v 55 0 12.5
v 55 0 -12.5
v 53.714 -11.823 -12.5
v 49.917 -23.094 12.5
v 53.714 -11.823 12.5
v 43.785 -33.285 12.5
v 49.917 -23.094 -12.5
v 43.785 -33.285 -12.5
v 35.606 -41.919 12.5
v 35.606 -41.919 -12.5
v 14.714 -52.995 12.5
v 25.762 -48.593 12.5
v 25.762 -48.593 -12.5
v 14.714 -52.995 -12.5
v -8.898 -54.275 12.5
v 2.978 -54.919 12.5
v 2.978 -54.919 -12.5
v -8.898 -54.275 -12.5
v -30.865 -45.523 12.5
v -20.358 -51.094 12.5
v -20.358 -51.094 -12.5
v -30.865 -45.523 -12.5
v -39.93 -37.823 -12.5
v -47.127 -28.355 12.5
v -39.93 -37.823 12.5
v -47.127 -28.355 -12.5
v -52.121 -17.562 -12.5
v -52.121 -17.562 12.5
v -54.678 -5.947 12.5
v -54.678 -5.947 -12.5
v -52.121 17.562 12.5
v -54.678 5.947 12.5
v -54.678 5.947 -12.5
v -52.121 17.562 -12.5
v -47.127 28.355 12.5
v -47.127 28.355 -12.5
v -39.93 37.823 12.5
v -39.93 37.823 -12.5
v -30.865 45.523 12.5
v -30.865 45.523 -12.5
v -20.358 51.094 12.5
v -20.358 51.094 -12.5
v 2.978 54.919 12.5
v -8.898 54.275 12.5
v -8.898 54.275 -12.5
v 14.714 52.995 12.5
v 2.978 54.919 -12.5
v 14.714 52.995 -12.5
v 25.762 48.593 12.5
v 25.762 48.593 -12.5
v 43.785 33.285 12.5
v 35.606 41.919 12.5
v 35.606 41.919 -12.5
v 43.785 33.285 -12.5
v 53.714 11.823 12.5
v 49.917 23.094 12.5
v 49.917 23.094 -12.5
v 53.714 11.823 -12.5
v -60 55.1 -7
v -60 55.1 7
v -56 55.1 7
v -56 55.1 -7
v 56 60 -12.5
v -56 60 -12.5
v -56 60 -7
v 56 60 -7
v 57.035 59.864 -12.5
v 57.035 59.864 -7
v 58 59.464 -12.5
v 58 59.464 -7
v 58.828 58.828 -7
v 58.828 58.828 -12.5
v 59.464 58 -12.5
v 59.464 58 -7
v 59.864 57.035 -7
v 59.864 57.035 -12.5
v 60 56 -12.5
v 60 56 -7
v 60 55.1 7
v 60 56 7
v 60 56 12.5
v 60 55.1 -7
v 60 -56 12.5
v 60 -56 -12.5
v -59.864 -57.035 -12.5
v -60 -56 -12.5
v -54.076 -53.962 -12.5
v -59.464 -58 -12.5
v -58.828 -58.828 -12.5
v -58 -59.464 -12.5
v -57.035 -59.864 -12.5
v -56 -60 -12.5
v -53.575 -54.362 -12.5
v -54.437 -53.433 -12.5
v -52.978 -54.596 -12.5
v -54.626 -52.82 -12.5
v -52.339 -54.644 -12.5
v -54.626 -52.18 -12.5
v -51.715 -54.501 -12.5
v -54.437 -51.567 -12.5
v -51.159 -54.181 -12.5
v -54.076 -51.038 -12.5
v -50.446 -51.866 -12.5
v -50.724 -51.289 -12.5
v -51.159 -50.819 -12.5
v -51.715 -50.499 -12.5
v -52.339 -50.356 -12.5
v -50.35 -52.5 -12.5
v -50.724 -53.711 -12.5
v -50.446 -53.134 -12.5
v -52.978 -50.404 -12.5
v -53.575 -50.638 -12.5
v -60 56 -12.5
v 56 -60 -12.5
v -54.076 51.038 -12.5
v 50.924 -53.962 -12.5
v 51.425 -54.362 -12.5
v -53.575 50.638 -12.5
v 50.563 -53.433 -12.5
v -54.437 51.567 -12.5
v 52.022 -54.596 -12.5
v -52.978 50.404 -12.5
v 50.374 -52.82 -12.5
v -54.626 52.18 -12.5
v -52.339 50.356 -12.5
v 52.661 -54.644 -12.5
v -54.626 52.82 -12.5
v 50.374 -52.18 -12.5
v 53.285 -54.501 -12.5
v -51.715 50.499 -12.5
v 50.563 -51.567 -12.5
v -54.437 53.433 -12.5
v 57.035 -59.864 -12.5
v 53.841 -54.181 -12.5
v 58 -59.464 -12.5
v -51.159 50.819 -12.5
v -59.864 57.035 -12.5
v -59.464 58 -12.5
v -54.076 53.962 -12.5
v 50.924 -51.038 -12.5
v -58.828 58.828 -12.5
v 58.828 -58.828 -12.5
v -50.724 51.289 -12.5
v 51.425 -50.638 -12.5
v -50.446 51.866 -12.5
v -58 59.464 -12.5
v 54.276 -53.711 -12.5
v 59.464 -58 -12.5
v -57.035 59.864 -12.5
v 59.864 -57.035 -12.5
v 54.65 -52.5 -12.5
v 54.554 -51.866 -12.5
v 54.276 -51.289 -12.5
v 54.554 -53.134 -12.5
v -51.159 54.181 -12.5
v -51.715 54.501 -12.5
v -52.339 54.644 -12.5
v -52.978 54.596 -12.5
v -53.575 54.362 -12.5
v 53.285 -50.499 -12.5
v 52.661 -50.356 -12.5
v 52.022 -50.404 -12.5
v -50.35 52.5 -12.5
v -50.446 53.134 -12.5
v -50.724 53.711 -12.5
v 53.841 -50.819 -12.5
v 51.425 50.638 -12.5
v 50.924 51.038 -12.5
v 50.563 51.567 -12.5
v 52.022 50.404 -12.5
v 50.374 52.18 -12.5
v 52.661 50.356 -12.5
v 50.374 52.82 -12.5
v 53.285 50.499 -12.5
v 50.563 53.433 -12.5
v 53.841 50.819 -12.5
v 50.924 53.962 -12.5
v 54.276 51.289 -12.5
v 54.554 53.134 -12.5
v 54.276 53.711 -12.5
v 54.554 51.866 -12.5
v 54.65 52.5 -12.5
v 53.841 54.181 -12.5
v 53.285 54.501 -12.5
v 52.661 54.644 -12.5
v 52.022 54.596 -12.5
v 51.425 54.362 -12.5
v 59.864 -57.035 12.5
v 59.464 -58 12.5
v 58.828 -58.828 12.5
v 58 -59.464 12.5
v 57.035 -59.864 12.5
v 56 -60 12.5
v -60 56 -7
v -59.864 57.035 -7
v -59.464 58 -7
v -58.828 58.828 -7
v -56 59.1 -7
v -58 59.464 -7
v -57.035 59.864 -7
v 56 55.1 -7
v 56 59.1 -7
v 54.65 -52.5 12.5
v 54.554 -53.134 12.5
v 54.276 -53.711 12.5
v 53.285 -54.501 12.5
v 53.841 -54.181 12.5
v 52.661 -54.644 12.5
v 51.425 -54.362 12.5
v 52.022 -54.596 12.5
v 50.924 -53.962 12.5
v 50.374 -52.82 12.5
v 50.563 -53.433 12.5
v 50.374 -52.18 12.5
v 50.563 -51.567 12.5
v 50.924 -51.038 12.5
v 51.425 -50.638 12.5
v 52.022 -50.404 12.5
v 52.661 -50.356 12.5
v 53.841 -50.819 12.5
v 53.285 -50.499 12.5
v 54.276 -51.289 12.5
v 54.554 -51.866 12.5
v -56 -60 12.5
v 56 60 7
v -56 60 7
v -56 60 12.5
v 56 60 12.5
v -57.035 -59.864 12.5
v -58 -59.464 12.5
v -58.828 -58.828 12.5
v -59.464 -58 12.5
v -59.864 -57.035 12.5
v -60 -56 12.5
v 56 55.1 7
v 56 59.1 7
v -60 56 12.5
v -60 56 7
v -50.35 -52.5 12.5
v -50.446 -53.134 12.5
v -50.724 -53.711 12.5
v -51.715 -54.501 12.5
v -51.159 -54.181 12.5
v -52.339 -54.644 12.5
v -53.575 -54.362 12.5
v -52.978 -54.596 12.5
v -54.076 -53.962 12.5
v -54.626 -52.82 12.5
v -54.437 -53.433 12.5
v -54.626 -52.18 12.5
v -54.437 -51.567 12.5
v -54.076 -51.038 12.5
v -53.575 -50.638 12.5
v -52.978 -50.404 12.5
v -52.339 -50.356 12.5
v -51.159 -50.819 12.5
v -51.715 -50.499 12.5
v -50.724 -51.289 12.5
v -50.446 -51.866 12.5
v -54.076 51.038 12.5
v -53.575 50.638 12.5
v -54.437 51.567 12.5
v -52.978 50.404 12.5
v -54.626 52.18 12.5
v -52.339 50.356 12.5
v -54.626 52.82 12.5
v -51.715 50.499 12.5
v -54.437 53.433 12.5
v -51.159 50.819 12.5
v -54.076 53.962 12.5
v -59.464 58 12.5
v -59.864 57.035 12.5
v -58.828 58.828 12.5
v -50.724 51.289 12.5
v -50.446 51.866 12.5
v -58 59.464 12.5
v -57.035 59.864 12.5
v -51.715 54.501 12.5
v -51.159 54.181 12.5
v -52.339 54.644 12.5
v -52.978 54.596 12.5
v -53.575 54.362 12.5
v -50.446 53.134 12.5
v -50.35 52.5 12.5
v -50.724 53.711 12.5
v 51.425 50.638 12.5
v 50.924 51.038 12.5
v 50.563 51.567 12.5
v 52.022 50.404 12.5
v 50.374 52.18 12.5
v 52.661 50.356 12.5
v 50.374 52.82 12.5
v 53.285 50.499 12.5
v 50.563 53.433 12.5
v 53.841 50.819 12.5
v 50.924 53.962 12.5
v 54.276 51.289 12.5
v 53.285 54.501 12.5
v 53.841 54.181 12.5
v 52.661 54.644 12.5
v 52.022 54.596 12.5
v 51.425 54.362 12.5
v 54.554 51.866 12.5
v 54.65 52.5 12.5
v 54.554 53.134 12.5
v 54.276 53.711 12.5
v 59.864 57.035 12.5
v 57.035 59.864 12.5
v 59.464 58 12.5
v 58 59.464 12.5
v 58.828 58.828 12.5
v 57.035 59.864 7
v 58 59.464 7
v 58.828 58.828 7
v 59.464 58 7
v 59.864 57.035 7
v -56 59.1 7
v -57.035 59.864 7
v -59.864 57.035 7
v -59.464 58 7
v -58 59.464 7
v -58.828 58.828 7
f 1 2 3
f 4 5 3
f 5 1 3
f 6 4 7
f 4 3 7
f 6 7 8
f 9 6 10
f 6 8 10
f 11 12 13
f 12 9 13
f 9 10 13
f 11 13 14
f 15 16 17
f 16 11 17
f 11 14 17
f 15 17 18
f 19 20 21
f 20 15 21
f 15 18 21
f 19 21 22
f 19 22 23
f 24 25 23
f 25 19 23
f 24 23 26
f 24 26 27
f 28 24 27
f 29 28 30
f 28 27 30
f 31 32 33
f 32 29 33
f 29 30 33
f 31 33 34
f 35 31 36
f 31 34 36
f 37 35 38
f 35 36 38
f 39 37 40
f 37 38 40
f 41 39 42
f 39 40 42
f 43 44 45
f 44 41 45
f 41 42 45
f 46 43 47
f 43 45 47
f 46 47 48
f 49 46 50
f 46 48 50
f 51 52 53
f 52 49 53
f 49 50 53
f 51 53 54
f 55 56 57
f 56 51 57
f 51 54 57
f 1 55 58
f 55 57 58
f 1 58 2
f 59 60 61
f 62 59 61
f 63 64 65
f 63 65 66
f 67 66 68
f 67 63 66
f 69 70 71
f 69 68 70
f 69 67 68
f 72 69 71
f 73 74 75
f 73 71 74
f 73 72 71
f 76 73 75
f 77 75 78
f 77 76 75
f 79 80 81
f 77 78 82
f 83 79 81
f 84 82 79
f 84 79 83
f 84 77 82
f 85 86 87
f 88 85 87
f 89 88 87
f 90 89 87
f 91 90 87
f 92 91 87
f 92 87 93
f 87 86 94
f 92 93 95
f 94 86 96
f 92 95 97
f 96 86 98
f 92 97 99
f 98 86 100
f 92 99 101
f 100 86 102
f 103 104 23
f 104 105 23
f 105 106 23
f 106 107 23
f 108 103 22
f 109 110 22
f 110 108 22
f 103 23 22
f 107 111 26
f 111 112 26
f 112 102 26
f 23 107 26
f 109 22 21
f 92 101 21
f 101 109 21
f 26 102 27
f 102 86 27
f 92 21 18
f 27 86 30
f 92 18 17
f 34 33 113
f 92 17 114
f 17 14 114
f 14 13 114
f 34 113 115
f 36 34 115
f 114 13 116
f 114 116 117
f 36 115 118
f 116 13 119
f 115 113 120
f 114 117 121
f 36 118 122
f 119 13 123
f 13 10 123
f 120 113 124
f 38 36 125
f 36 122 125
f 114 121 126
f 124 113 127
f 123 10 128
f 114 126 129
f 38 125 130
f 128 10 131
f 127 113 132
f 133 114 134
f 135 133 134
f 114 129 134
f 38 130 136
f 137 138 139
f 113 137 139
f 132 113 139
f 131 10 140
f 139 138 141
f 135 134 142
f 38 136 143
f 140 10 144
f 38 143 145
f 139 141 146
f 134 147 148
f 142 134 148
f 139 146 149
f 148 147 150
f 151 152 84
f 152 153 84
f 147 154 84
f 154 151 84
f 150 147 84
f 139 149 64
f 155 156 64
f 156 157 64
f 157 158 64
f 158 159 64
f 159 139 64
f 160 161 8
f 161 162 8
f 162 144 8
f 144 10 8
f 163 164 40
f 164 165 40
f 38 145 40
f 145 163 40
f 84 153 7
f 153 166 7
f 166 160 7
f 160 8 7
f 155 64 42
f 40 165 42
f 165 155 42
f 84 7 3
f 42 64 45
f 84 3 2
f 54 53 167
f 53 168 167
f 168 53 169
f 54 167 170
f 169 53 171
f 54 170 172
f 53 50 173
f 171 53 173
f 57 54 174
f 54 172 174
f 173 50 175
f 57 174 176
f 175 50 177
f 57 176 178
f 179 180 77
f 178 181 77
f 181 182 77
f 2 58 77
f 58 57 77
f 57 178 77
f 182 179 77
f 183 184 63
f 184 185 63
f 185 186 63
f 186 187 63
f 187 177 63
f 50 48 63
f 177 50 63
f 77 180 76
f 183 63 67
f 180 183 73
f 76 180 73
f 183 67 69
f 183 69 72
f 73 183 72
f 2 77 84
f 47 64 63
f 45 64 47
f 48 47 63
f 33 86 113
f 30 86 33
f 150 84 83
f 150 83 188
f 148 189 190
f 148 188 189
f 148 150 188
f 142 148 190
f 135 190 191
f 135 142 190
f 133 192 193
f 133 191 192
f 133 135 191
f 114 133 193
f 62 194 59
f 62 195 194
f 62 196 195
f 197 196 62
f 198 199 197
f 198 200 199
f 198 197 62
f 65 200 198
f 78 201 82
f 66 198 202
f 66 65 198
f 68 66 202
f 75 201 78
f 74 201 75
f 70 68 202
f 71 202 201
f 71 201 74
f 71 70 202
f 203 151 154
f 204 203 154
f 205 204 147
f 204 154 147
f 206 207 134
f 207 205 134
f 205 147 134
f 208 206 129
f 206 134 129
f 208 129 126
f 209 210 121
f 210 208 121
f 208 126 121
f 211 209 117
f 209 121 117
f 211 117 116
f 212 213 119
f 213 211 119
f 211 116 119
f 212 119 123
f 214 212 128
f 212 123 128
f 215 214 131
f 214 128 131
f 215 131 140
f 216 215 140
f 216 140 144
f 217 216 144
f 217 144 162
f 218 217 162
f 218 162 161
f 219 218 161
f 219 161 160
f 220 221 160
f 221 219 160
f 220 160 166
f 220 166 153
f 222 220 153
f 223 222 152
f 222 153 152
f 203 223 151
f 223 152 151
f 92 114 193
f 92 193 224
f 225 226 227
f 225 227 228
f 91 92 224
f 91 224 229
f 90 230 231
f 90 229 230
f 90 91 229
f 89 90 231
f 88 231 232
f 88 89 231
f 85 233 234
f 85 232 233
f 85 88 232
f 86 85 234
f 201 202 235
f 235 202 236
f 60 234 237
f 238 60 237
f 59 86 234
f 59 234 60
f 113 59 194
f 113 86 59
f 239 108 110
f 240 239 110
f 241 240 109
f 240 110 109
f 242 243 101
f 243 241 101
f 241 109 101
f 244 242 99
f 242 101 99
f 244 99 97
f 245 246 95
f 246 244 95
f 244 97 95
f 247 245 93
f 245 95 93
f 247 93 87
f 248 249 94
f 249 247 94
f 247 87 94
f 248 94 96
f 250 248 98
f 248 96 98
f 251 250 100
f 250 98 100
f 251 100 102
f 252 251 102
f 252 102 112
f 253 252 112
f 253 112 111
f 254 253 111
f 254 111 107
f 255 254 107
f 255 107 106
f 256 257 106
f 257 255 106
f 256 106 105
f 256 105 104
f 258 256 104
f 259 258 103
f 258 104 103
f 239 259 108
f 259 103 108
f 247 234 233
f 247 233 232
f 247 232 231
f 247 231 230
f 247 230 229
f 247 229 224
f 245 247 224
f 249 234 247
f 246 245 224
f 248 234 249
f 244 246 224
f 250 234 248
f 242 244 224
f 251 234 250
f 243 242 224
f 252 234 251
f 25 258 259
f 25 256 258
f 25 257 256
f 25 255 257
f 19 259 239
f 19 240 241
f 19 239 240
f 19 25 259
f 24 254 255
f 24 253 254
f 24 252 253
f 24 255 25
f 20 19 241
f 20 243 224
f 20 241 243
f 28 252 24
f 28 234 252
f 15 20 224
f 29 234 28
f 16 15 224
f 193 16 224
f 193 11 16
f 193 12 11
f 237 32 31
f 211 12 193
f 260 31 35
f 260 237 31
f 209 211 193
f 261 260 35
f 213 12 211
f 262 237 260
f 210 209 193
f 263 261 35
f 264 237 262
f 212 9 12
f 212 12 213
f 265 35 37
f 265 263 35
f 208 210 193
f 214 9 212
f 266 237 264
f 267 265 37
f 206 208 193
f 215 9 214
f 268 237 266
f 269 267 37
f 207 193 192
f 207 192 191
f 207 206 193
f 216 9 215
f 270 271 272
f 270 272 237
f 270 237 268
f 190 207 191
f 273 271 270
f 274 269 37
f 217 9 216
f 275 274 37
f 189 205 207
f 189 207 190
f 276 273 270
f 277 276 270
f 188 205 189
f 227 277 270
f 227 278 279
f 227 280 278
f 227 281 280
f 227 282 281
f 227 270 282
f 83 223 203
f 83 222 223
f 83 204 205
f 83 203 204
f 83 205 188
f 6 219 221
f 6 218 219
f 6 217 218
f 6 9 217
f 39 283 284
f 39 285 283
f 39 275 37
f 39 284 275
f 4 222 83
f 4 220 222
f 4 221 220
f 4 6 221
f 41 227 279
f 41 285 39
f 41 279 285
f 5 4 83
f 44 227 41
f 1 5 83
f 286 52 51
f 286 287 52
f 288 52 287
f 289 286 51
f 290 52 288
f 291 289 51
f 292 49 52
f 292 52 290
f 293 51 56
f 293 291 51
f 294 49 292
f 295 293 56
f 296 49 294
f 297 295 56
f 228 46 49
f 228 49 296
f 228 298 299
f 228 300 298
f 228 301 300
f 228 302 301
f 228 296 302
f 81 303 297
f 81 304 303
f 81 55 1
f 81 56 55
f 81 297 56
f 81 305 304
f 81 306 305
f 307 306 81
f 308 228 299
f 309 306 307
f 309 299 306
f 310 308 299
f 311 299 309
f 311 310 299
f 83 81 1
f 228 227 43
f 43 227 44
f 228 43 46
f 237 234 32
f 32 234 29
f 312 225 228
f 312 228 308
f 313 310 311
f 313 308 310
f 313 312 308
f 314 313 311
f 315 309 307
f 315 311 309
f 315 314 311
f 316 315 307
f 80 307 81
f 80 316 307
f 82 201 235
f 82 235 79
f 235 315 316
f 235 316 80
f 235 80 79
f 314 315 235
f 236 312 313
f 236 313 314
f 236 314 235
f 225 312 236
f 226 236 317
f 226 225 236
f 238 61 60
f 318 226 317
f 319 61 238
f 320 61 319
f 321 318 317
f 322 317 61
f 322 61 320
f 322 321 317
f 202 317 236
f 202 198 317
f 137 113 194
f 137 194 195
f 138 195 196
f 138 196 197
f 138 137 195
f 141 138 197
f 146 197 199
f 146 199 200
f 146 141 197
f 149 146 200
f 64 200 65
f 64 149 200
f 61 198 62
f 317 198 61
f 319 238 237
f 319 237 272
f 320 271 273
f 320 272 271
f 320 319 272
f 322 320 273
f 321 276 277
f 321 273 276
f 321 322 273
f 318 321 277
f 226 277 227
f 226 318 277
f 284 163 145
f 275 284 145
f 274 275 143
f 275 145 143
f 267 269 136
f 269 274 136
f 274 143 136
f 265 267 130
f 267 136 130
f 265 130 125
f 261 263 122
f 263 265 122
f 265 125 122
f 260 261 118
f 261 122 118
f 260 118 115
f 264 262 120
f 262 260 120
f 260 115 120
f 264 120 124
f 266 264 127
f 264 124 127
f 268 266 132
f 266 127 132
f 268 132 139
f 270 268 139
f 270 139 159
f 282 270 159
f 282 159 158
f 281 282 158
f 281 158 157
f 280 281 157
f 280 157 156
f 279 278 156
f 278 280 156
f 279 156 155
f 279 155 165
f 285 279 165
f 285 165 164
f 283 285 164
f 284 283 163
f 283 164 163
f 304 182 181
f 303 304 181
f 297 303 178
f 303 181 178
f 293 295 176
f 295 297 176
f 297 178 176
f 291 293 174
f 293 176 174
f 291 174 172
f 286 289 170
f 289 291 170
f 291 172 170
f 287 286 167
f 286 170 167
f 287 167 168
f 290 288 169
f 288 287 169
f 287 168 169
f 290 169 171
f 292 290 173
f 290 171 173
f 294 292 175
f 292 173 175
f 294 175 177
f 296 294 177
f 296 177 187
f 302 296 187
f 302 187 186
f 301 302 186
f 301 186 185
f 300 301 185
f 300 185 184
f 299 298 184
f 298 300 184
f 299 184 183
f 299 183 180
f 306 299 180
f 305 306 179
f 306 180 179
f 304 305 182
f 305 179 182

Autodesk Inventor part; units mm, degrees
ref_plane "YZ Plane" through (0, 0, 0) normal (1, 0, 0) x (0, 1, 0)
ref_plane "XZ Plane" through (0, 0, 0) normal (0, 1, 0) x (-1, 0, 0)
ref_plane "XY Plane" through (0, 0, 0) normal (0, 0, 1) x (1, 0, 0)
sketch "Sketch1" plane through (0, 0, 0) normal (0, 0, 1) x (1, 0, 0)
  line L0 (-56, 60) -> (56, 60)
  line L1 (60, 56) -> (60, -56)
  line L2 (56, -60) -> (-56, -60)
  line L3 (-60, -56) -> (-60, 56)
  line L4 (-60, 60) -> (60, -60) construction
  line L5 (60, 60) -> (-60, -60) construction
  circle A0 centre (0, 0) radius 55
  line L6 (-52.5, 52.5) -> (52.5, 52.5) construction
  line L7 (52.5, 52.5) -> (52.5, -52.5) construction
  line L8 (52.5, -52.5) -> (-52.5, -52.5) construction
  line L9 (-52.5, -52.5) -> (-52.5, 52.5) construction
  line L10 (-52.5, 52.5) -> (52.5, -52.5) construction
  line L11 (52.5, 52.5) -> (-52.5, -52.5) construction
  circle A1 centre (-52.5, 52.5) radius 2.15
  circle A2 centre (-52.5, -52.5) radius 2.15
  circle A3 centre (52.5, -52.5) radius 2.15
  circle A4 centre (52.5, 52.5) radius 2.15
  arc A5 (-56, 60) -> (-60, 56) centre (-56, 56) ccw
  arc A6 (-60, -56) -> (-56, -60) centre (-56, -56) ccw
  arc A7 (56, -60) -> (60, -56) centre (56, -56) ccw
  arc A8 (60, 56) -> (56, 60) centre (56, 56) ccw
  dimension "d0" = 120
  dimension "d1" = 120
  dimension "d2" = 110
  dimension "d3" = 105
  dimension "d4" = 4.3
  dimension "d5" = 4.3
  dimension "d6" = 4.3
  dimension "d7" = 4.3
  dimension "d8" = 4
extrude "Extrusion1" add sketch "Sketch1" along normal mid plane 25
sketch "Sketch3" plane through (-56, 60, -12.5) normal (0, 1, 0) x (1, 0, 0)
  line L0 (-4, -5.5) -> (116, -5.5)
  line L1 (116, -5.5) -> (116, -19.5)
  line L2 (116, -19.5) -> (-4, -19.5)
  line L3 (-4, -19.5) -> (-4, -5.5)
  line L4 (-4, -5.5) -> (116, -19.5) construction
  line L5 (116, -5.5) -> (-4, -19.5) construction
  line L6 (-4, 0) -> (-4, -25) projected
  line L7 (116, 0) -> (116, -25) projected
  point P0 (56, -12.5)
  point P1 (-4, -12.5)
  dimension "d15" = 14
extrude "Extrusion3" cut sketch "Sketch3" against normal blind 0.9
sketch "Sketch4" plane through (-56, 59.1, -12.5) normal (0, 1, 0) x (1, 0, 0)
  line L0 (114.5278, -5.5) -> (114.5278, -19.5) projected
  line L1 (-2.5278, -5.5) -> (114.5278, -5.5) projected
  line L2 (-2.5278, -19.5) -> (-2.5278, -5.5) projected
  line L3 (114.5278, -19.5) -> (-2.5278, -19.5) projected
  line L4 (116, 0) -> (116, -25) projected
  line L5 (-4, 0) -> (-4, -25) projected
  line L6 (116, 0) -> (116, -25) projected
  line L7 (114.5278, -19.5) -> (-2.5278, -19.5) projected
  line L8 (116, -5.5) -> (112, -5.5)
  line L9 (112, -5.5) -> (112, -19.5)
  line L10 (112, -19.5) -> (116, -19.5)
  line L11 (116, -19.5) -> (116, -5.5)
  line L12 (-4, -5.5) -> (0, -5.5)
  line L13 (0, -5.5) -> (0, -19.5)
  line L14 (0, -19.5) -> (-4, -19.5)
  line L15 (-4, -19.5) -> (-4, -5.5)
  point P0 (56, -12.5)
  point P1 (116, -19.5)
  point P2 (116, -5.5)
  point P3 (-4, -19.5)
  point P4 (-2.5278, -19.5)
  dimension "d18" = 4
  dimension "d19" = 4
extrude "Extrusion4" cut sketch "Sketch4" against normal blind 4 contours L8 L4 L10 L0 | L0 L3 L9 L1 | L13 L3 L2 L1 | L2 L14 L5 L12
equation "\"d0\" = Size"
equation "\"d1\" = Size"
equation "\"d2\" = DuctDiammeter"
equation "\"d3\" = DistanceBetweenHoles"
equation "\"d8\" = CornerRadius"
equation "\"d9\" = Depth"
equation "\"Size\" = 120"
equation "\"DistanceBetweenHoles\" = 105"
equation "\"DuctDiammeter\" = 110"
equation "\"CornerRadius\" = 4"
equation "\"Depth\" = 25"
properties material "ABS Plastic"
